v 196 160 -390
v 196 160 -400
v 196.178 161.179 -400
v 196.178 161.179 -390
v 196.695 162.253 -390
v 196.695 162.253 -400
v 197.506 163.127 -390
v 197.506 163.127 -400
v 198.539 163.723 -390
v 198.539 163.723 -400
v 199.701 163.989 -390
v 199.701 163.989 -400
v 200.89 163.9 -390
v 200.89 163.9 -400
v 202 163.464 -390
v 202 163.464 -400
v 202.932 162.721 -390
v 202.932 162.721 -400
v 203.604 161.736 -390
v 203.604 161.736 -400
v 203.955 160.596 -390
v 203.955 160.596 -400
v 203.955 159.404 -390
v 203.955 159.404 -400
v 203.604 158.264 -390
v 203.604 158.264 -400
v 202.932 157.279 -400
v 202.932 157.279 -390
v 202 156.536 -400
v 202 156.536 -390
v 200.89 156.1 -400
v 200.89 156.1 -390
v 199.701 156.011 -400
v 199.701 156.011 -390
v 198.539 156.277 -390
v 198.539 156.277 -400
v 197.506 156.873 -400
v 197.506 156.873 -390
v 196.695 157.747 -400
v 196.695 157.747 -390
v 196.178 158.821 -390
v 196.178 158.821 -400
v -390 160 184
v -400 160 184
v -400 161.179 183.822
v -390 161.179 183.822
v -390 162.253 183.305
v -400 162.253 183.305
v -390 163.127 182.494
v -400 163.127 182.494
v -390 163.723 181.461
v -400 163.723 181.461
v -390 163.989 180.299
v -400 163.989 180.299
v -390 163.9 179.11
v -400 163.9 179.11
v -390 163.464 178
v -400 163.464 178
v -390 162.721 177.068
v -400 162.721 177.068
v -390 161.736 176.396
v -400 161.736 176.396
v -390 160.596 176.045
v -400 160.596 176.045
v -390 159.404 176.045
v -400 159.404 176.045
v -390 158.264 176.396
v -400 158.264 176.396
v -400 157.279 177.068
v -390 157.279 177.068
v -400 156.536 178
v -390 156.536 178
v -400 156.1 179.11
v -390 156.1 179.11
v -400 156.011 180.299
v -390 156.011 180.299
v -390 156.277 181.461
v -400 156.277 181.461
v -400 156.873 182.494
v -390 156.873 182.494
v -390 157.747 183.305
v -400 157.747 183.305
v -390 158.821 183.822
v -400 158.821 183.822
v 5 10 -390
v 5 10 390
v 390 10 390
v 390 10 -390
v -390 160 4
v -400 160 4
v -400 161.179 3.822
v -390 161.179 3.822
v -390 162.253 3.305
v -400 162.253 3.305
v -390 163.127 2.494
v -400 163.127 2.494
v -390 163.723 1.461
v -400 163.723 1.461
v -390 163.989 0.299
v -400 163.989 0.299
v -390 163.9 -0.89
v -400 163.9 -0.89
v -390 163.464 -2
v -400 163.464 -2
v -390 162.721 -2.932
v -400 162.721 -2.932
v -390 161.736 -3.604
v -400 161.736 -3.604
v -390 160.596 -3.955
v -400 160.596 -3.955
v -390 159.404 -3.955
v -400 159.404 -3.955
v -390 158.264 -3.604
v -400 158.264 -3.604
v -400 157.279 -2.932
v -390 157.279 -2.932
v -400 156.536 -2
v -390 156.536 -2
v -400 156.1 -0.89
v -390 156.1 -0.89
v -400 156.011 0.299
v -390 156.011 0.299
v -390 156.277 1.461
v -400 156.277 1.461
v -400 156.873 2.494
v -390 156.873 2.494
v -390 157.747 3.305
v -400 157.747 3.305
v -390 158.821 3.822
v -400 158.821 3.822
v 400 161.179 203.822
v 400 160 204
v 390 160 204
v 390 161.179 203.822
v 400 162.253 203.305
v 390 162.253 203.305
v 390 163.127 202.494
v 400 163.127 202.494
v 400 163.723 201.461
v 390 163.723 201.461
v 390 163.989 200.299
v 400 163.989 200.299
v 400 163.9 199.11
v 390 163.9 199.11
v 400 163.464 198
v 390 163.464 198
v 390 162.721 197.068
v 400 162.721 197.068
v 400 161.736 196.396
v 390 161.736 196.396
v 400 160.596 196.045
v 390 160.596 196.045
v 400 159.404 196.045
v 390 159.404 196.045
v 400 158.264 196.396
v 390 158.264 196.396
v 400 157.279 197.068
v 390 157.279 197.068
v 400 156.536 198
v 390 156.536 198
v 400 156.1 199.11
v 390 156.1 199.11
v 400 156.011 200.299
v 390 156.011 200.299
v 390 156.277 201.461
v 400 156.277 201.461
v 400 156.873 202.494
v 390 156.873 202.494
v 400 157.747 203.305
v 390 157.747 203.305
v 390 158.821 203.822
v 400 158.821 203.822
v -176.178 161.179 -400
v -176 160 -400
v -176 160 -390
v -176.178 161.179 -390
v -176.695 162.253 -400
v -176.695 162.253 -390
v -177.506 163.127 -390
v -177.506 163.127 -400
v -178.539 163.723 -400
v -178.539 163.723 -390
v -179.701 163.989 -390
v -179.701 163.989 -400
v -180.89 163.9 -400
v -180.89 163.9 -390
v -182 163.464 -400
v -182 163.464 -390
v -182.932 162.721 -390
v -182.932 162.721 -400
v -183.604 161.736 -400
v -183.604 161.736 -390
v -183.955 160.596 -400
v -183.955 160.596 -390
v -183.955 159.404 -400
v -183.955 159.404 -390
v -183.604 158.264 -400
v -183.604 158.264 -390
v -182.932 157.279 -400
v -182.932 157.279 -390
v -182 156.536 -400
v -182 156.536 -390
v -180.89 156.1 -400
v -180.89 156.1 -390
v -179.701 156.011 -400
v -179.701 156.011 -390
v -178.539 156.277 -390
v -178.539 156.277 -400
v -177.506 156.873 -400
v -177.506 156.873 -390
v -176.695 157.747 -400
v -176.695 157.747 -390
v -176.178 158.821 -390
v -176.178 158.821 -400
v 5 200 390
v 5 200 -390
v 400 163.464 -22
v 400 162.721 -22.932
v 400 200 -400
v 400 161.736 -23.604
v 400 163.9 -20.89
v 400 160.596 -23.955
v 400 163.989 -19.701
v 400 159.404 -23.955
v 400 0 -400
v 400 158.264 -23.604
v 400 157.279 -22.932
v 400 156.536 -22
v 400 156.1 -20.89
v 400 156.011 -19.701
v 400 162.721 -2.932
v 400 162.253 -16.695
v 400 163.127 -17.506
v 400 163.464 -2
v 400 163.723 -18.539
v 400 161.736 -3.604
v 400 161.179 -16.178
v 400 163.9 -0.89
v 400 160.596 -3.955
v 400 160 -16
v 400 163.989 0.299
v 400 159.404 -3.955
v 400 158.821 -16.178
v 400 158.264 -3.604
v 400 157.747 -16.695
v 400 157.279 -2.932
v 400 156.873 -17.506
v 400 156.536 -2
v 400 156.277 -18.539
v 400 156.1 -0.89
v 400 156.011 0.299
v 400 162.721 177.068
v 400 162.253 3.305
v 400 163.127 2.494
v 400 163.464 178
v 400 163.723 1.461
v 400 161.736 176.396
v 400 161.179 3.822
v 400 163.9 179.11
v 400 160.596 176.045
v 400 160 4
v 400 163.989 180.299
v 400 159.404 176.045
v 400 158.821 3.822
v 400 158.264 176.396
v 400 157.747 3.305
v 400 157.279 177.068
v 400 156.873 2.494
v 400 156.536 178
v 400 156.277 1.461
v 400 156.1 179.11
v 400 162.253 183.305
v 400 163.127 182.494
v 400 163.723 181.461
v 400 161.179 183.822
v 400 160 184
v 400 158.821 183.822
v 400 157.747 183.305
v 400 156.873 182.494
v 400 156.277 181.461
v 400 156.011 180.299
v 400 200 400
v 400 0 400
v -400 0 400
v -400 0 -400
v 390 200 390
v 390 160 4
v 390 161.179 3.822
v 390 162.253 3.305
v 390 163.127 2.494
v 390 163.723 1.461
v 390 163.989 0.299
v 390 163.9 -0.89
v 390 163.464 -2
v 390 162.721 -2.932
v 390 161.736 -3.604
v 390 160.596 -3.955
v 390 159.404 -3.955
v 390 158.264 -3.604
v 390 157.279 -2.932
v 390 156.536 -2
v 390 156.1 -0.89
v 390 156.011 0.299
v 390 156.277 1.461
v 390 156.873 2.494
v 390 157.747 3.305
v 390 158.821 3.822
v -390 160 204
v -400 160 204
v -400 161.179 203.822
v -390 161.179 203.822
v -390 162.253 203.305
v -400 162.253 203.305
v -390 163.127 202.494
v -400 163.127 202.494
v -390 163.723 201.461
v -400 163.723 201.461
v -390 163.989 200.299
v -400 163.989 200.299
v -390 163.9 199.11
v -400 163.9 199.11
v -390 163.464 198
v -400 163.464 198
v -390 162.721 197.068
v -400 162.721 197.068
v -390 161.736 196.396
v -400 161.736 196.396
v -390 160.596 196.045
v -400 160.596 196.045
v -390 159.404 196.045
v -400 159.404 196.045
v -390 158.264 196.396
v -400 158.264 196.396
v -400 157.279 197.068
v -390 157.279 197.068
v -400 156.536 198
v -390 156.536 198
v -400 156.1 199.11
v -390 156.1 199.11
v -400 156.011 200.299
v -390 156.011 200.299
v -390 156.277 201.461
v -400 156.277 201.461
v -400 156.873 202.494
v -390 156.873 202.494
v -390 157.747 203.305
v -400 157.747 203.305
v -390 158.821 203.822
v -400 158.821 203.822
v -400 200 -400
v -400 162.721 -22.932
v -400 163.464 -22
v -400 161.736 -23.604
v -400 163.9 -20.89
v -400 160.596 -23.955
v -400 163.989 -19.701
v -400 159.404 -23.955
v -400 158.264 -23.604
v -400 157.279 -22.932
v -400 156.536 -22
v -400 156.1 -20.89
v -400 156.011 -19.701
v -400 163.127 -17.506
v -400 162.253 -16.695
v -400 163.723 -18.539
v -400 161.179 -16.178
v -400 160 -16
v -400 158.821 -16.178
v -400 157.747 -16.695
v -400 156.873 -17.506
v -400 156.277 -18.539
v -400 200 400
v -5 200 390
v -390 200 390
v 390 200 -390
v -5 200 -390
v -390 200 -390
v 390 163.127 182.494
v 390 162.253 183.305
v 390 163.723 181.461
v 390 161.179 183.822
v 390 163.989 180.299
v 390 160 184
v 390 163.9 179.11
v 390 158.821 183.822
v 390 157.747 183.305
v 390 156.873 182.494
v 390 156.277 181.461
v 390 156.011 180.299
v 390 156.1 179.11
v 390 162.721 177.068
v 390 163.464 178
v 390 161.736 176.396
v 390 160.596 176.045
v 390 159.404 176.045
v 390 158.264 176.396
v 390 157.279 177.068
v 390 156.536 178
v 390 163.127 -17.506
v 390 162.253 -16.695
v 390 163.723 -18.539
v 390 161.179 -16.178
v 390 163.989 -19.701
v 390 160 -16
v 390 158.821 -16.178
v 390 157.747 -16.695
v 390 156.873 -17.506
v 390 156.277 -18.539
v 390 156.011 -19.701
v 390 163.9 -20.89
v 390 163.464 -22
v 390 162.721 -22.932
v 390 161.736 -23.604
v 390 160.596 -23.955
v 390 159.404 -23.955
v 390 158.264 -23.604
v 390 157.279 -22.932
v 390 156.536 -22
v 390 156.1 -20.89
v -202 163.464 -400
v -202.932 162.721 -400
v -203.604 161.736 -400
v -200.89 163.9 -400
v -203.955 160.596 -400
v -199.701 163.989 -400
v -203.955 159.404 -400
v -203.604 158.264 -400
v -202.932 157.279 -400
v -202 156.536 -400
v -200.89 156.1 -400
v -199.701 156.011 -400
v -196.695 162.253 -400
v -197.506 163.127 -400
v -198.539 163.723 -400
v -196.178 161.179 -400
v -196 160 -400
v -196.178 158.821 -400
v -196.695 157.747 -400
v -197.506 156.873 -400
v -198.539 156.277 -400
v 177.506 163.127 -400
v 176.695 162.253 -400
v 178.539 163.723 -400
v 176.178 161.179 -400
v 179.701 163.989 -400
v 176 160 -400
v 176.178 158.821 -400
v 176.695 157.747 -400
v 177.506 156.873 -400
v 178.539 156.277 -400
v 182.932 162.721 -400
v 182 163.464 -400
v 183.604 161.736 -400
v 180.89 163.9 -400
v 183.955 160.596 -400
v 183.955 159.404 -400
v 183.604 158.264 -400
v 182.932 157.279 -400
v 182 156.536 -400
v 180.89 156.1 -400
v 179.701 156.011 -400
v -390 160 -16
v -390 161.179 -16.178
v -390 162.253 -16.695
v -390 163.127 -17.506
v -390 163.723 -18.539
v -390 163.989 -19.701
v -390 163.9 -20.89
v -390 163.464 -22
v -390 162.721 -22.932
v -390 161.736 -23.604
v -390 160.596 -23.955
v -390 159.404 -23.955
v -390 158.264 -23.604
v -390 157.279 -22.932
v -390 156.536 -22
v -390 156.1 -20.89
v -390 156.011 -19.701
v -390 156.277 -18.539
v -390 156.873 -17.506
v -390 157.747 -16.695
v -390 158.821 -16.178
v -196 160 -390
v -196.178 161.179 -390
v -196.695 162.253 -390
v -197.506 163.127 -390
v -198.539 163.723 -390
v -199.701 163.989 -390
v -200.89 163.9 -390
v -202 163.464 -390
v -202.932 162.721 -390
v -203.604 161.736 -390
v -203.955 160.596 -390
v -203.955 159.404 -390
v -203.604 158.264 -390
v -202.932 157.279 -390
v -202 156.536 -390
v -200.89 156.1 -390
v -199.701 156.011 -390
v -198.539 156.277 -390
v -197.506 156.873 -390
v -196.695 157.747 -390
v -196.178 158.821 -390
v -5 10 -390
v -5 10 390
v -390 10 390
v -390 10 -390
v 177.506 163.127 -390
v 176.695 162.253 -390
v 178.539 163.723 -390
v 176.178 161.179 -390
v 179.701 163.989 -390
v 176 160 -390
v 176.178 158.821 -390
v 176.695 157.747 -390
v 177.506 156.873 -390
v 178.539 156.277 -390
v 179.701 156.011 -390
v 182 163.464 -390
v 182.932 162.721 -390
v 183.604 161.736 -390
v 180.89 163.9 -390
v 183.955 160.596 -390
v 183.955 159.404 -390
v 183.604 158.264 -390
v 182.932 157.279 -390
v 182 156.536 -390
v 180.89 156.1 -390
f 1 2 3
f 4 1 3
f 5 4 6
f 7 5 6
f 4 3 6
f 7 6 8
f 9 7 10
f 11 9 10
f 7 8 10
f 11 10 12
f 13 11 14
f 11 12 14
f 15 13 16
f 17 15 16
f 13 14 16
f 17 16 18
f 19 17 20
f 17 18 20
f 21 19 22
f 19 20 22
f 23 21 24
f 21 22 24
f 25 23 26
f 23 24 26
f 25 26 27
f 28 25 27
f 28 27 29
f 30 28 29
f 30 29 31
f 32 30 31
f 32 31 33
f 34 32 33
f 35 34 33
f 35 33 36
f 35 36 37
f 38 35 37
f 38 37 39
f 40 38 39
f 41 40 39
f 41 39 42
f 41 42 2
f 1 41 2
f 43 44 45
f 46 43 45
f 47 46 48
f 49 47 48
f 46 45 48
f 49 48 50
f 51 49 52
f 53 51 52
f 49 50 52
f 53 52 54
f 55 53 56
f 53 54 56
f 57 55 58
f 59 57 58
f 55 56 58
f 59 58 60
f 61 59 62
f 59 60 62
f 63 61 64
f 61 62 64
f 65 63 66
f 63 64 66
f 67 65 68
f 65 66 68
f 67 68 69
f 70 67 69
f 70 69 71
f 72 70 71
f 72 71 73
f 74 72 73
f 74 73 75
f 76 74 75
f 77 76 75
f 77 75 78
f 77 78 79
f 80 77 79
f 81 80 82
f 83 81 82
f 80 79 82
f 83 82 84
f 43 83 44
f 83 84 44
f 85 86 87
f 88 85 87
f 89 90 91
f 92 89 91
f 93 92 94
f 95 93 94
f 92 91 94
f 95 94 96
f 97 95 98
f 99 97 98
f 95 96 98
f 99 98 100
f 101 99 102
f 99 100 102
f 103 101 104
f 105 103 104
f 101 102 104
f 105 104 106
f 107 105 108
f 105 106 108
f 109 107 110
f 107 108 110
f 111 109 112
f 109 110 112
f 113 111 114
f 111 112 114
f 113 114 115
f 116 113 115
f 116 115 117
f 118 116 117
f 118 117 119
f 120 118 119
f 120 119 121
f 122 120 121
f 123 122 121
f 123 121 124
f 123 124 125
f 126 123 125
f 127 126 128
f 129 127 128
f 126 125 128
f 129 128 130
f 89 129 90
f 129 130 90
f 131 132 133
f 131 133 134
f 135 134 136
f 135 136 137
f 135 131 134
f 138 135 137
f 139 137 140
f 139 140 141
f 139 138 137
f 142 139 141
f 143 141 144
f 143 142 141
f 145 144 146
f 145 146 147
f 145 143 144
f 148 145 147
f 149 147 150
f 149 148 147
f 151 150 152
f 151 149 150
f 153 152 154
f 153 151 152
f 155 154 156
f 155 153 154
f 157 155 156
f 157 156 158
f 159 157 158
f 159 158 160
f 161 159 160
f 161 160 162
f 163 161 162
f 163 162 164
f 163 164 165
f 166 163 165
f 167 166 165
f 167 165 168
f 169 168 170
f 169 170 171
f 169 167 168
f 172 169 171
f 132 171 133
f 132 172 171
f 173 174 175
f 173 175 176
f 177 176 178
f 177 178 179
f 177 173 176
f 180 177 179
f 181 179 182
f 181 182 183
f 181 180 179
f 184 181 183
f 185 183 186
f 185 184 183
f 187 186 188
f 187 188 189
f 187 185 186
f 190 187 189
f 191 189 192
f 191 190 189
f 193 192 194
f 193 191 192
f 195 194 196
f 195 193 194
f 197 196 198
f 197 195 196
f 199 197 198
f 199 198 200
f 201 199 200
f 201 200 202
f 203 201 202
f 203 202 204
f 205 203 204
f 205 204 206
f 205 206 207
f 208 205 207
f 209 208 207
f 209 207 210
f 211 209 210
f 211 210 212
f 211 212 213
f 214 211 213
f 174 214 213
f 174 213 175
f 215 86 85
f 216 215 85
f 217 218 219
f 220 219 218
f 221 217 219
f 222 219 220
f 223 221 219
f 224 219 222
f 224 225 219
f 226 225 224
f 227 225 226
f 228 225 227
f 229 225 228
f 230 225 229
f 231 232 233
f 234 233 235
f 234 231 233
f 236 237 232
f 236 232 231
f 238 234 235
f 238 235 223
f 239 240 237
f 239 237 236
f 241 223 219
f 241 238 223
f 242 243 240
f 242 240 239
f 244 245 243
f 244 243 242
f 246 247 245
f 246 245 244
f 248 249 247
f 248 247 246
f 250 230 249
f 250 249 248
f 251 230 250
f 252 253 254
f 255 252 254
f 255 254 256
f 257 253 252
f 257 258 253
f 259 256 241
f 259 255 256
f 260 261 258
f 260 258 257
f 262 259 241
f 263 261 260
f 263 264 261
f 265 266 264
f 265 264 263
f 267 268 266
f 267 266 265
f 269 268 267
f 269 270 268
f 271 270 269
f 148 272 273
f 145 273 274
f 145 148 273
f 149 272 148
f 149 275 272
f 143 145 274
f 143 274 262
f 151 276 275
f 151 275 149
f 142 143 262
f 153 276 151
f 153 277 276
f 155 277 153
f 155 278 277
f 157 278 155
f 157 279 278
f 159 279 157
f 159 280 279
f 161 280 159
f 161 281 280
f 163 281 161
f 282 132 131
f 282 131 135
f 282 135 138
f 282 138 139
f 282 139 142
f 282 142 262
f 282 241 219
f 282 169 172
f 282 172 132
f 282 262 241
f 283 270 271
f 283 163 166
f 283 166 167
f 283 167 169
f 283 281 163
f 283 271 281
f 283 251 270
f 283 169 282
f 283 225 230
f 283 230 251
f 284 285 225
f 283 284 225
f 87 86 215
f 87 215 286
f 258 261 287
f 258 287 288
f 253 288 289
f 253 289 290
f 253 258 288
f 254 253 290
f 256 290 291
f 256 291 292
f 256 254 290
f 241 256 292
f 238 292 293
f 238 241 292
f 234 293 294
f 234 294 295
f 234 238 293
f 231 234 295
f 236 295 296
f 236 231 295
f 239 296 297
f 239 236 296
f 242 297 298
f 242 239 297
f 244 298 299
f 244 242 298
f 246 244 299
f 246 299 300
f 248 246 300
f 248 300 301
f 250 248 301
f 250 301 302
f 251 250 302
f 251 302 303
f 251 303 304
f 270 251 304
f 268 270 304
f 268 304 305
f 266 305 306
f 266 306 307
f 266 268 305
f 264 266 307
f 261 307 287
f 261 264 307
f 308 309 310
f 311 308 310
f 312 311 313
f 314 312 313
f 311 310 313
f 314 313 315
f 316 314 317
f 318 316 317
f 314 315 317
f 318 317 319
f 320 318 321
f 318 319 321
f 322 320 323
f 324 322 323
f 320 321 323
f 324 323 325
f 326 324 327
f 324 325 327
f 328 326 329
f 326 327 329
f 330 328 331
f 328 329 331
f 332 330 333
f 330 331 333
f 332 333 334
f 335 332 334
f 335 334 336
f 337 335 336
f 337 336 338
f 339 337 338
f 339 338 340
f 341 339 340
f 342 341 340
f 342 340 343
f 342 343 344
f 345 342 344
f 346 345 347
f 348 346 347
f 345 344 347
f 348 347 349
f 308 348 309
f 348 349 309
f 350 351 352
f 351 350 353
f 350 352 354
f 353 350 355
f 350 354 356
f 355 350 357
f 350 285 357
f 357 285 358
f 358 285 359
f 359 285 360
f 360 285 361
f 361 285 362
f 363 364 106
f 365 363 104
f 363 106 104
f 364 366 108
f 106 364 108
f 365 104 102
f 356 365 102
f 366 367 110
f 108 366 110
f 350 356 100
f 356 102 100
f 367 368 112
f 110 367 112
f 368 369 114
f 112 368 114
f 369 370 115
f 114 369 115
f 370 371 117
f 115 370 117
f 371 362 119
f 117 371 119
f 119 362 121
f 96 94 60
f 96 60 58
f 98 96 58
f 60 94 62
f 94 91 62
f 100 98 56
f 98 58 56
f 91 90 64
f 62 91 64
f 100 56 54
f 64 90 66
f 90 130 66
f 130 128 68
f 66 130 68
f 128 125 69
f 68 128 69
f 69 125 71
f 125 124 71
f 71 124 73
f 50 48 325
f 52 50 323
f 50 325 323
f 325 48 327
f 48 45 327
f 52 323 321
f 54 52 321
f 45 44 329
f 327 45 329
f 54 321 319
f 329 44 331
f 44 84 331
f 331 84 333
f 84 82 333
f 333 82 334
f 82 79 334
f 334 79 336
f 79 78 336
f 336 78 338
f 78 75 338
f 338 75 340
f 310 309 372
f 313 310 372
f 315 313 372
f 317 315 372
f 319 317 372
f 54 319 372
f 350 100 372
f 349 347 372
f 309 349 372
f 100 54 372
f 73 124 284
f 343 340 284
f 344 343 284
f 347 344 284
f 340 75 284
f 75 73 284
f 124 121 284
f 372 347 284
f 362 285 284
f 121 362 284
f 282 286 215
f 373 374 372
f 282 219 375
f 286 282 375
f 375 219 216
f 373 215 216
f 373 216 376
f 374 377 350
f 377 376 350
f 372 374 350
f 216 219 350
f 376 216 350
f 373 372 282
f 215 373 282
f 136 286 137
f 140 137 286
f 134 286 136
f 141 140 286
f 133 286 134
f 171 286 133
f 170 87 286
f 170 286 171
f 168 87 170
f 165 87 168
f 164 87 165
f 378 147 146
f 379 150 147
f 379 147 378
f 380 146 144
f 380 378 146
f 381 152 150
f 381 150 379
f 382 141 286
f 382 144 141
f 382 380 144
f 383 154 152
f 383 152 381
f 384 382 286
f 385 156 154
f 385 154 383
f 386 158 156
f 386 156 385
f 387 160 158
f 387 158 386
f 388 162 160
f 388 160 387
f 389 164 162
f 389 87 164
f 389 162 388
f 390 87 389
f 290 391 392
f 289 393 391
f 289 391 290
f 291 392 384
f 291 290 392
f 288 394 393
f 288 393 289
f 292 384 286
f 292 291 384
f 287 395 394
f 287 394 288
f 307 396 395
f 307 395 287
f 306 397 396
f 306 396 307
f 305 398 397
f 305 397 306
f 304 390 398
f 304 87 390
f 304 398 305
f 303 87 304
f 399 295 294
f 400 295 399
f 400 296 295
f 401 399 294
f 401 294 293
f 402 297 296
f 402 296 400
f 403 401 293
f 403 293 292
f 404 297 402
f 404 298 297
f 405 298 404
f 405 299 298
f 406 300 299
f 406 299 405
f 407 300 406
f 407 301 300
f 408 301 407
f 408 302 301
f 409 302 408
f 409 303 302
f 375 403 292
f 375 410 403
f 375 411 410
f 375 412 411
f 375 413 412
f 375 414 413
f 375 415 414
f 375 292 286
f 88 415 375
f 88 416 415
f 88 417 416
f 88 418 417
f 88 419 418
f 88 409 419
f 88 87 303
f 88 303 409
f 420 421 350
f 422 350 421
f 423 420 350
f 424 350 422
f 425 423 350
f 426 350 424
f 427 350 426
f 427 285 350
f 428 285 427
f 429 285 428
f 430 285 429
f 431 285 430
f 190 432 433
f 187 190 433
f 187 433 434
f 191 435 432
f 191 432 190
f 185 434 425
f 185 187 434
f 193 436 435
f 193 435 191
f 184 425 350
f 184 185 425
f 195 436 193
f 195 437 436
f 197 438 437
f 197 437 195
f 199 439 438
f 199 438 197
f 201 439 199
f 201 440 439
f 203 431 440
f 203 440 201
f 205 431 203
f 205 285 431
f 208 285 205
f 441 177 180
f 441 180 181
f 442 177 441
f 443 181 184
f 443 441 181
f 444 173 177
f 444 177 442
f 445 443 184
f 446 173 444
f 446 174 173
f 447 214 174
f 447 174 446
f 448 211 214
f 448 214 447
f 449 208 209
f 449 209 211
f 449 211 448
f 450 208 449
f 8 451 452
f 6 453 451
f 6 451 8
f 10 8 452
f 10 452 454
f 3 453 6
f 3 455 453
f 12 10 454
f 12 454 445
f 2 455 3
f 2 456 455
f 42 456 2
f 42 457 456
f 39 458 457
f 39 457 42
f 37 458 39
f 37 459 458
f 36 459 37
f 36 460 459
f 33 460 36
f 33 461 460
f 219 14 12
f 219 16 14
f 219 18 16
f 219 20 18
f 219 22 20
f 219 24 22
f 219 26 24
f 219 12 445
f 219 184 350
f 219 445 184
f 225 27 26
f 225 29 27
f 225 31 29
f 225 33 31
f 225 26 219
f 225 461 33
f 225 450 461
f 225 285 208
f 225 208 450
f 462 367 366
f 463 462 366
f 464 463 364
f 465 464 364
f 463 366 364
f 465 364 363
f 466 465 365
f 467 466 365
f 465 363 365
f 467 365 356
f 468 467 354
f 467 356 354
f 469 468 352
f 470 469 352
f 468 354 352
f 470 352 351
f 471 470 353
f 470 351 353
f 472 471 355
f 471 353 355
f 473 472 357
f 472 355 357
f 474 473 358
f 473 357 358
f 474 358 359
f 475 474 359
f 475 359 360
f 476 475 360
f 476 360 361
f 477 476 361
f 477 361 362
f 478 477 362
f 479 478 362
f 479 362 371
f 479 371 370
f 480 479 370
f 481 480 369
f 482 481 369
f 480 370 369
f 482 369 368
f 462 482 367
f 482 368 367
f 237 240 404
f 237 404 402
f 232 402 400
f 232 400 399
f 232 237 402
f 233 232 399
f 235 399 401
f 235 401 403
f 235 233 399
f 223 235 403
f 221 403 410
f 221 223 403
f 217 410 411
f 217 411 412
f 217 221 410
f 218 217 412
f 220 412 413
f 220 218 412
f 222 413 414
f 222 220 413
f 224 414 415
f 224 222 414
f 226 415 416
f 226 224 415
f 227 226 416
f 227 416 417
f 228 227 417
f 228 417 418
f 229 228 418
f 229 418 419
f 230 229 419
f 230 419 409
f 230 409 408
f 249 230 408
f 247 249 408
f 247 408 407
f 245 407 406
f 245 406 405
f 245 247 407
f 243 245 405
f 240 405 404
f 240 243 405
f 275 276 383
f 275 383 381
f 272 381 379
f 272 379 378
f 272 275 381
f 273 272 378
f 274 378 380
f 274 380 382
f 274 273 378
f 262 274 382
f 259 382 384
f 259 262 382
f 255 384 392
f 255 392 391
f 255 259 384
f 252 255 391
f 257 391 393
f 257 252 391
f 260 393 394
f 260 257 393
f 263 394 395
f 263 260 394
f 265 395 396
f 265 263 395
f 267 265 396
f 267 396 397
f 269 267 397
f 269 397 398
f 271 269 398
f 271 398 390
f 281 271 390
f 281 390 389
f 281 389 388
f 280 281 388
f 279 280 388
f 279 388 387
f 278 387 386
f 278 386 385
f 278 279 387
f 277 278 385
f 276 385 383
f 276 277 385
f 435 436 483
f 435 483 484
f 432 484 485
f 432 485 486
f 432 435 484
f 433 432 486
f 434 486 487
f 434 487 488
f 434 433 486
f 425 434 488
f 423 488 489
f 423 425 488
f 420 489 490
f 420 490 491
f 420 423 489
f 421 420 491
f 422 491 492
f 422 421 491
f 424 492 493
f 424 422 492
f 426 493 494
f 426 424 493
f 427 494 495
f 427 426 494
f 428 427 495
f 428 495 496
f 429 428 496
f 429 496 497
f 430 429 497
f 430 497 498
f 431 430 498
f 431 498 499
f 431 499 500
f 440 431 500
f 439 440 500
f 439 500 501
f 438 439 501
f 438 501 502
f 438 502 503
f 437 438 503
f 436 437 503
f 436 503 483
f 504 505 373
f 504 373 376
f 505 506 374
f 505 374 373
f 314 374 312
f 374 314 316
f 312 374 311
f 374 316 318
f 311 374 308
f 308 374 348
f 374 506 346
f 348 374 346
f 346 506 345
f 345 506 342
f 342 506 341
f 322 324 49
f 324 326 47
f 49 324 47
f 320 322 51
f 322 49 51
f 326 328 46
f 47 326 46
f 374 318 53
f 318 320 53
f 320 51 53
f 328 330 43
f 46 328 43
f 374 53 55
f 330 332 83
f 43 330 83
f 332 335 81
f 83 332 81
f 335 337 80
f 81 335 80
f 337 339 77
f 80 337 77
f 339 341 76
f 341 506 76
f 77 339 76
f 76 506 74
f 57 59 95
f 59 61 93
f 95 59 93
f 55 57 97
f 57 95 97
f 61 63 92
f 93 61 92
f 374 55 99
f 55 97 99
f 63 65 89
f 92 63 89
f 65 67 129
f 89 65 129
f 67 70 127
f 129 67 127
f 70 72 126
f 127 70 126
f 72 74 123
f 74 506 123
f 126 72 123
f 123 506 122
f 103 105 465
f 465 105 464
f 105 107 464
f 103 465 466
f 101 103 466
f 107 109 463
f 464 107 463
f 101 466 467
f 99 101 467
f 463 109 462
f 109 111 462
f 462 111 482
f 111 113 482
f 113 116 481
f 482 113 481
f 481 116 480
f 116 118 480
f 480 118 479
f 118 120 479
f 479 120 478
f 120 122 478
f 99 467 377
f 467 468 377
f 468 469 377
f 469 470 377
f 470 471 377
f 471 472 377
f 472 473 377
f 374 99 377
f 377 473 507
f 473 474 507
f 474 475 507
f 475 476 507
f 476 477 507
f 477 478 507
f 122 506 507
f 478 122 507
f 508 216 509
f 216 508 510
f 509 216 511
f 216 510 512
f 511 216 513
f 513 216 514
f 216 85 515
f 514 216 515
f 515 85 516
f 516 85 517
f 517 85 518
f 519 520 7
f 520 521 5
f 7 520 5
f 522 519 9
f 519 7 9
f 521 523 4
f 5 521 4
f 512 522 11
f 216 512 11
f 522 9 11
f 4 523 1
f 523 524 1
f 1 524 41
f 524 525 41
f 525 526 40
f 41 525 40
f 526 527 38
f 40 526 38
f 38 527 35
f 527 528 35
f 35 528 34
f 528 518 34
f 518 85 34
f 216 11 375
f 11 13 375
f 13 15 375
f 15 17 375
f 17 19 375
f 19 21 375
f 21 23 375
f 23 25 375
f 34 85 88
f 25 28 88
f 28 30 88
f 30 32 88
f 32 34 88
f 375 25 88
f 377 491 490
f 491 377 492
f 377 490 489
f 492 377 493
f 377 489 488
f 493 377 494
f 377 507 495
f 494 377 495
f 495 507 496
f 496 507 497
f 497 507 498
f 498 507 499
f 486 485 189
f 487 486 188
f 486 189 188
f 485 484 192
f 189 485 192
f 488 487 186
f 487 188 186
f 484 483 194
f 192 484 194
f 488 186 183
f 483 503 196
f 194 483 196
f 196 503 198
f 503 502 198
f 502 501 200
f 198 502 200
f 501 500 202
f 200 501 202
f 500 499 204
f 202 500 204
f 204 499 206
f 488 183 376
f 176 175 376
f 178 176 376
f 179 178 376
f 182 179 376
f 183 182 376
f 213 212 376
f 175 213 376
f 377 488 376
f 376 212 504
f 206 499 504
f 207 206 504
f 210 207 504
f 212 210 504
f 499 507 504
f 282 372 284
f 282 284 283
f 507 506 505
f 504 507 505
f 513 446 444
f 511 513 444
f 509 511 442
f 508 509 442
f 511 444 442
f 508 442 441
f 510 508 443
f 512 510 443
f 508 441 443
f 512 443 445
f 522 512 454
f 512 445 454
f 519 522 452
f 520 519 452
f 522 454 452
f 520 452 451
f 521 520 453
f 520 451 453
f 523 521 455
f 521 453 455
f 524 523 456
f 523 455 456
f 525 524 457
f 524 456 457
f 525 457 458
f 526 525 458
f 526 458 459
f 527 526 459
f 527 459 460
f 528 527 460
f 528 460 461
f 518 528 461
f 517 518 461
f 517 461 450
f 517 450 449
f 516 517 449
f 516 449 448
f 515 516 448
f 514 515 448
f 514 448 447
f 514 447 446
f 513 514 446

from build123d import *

# Parameters (mm, degrees)
SKETCH_1_W          = 800
SKETCH_1_H          = 800
SKETCH_1_W_2        = 385
SKETCH_1_H_2        = 780
EXTRUDE_1_DEPTH     = 200
SKETCH_2_W          = 800
SKETCH_2_H          = 800
EXTRUDE_2_DEPTH     = 10
EXTRUDE_3_DEPTH     = 10
EXTRUDE_3_2_DEPTH   = 10
SKETCH_4_R          = 4
CUT_EXTRUDE_1_DEPTH = 10
SKETCH_5_R          = 4
CUT_EXTRUDE_2_DEPTH = 10
EXTRUDE_4_DEPTH     = 10
CUT_EXTRUDE_3_REACH = 1087.28
SKETCH_7_R          = 4
CUT_EXTRUDE_4_REACH = 1156.96
SKETCH_8_R          = 4
SKETCH_9_W          = 2800
SKETCH_9_H          = 2800
SKETCH_9_W_2        = 800
SKETCH_9_H_2        = 800
CUT_EXTRUDE_5_DEPTH = 1157.647305275


with BuildPart() as part:
    # 草图1 → 凸台-拉伸1 (new body)
    with BuildSketch(Plane(origin=(0, 0, 0), x_dir=(1, 0, 0), z_dir=(0, 1, 0))):
        Rectangle(SKETCH_1_W, SKETCH_1_H)
        with Locations((-197.5, 0)):
            Rectangle(SKETCH_1_W_2, SKETCH_1_H_2, mode=Mode.SUBTRACT)
        with Locations((197.5, 0)):
            Rectangle(SKETCH_1_W_2, SKETCH_1_H_2, mode=Mode.SUBTRACT)
    extrude(amount=EXTRUDE_1_DEPTH)

    # 草图2 → 凸台-拉伸2 (add)
    with BuildSketch(Plane.XZ):
        Rectangle(SKETCH_2_W, SKETCH_2_H)
    extrude(amount=-EXTRUDE_2_DEPTH)

    # 草图4 → 切除-拉伸1 (cut)
    with BuildSketch(Plane.ZY.offset(400)):
        with Locations((180, 160)):
            Circle(SKETCH_4_R)
        with Locations((200, 160)):
            Circle(SKETCH_4_R)
        with Locations((-20, 160)):
            Circle(SKETCH_4_R)
        with Locations((0, 160)):
            Circle(SKETCH_4_R)
    cut_extrude_1 = extrude(amount=-CUT_EXTRUDE_1_DEPTH, mode=Mode.SUBTRACT)


with BuildPart() as body_2:
    # 草图3 → 凸台-拉伸3 (new body)
    with BuildSketch(Plane(origin=(0, 200, 0), x_dir=(1, 0, 0), z_dir=(0, 1, 0))):
        with BuildLine():
            Line((-400, 400), (-400, -400))
            Line((-400, -400), (-552.7864045, -400))
            ThreePointArc((-552.7864045, -400), (-682.754282993, -327.538161854), (-689.4427191, -178.8854382))
            Line((-689.4427191, -178.8854382), (-400, 400))
        make_face()
    extrude(amount=-EXTRUDE_3_DEPTH)

    # 草图5 → 切除-拉伸2 (cut)
    with BuildSketch(Plane(origin=(0, 200, 0), x_dir=(1, 0, 0), z_dir=(0, 1, 0))):
        with Locations(Location((-430, -180, 0), (0, 0, 270))):
            Circle(SKETCH_5_R)
        with Locations(Location((-430, -200, 0), (0, 0, 270))):
            Circle(SKETCH_5_R)
        with Locations(Location((-430, 20, 0), (0, 0, 270))):
            Circle(SKETCH_5_R)
        with Locations(Location((-430, 0, 0), (0, 0, 270))):
            Circle(SKETCH_5_R)
    cut_extrude_2 = extrude(amount=-CUT_EXTRUDE_2_DEPTH, mode=Mode.SUBTRACT)


with BuildPart() as body_3:
    # 草图3 → Extrude 3 2 (new body)
    with BuildSketch(Plane(origin=(0, 200, 0), x_dir=(1, 0, 0), z_dir=(0, 1, 0))):
        with BuildLine():
            Line((689.4427191, -178.8854382), (400, 400))
            Line((400, 400), (400, -400))
            Line((400, -400), (552.7864045, -400))
            ThreePointArc((552.7864045, -400), (682.754282993, -327.538161854), (689.4427191, -178.8854382))
        make_face()
    extrude(amount=-EXTRUDE_3_2_DEPTH)


with BuildPart() as mirror_1_tool:
    # 镜向1: 切除-拉伸1, 切除-拉伸2 across plane
    add(cut_extrude_1.mirror(Plane(origin=(0, 0, 0), x_dir=(0, 0, 1), z_dir=(1, 0, 0))))
    add(cut_extrude_2.mirror(Plane(origin=(0, 0, 0), x_dir=(0, 0, 1), z_dir=(1, 0, 0))))


with BuildPart() as part_1:
    add(part.part)

    # 镜向1: cut by mirror_1_tool
    add(mirror_1_tool.part, mode=Mode.SUBTRACT)


    add(body_2.part)  # 凸台-拉伸4 merges body 2


with BuildPart() as body_3_1:
    add(body_3.part)

    # 镜向1: cut by mirror_1_tool
    add(mirror_1_tool.part, mode=Mode.SUBTRACT)


with BuildPart() as part_2:
    add(part_1.part)

    add(body_3_1.part)  # 凸台-拉伸4 merges body 3
    # 草图6 → 凸台-拉伸4 (add)
    with BuildSketch(Plane(origin=(0, 200, 0), x_dir=(1, 0, 0), z_dir=(0, 1, 0))):
        with BuildLine():
            Line((-400, 400), (-221.1145618, 757.7708764))
            ThreePointArc((-221.1145618, 757.7708764), (0, 894.427191), (221.1145618, 757.7708764))
            Line((221.1145618, 757.7708764), (400, 400))
            Line((400, 400), (-400, 400))
        make_face()
    extrude(amount=-EXTRUDE_4_DEPTH)

    # 草图7 → 切除-拉伸3 (cut, up to next)
    with BuildSketch(Plane(origin=(0, 0, -400), x_dir=(-1, 0, 0), z_dir=(0, 0, -1)), mode=Mode.PRIVATE) as cut_extrude_3_sk1:
        with Locations((-200, 160)):
            Circle(SKETCH_7_R)
    cut_extrude_3_tool1 = extrude(cut_extrude_3_sk1.sketch, amount=-CUT_EXTRUDE_3_REACH, mode=Mode.PRIVATE) & part_2.part
    # 草图7 → 切除-拉伸3 (cut, up to next)
    with BuildSketch(Plane(origin=(0, 0, -400), x_dir=(-1, 0, 0), z_dir=(0, 0, -1)), mode=Mode.PRIVATE) as cut_extrude_3_sk2:
        with Locations((-180, 160)):
            Circle(SKETCH_7_R)
    cut_extrude_3_tool2 = extrude(cut_extrude_3_sk2.sketch, amount=-CUT_EXTRUDE_3_REACH, mode=Mode.PRIVATE) & part_2.part
    cut_extrude_3_1 = cut_extrude_3_tool1.solids().sort_by_distance((200, 160, -400))[0]
    add(cut_extrude_3_1, mode=Mode.SUBTRACT)
    cut_extrude_3_2 = cut_extrude_3_tool2.solids().sort_by_distance((180, 160, -400))[0]
    add(cut_extrude_3_2, mode=Mode.SUBTRACT)
    cut_extrude_3 = cut_extrude_3_1 + cut_extrude_3_2  # 切除-拉伸3 as one shape, for the pattern or mirror that repeats it

    # 草图8 → 切除-拉伸4 (cut, up to next)
    with BuildSketch(Plane.XZ.offset(-190), mode=Mode.PRIVATE) as cut_extrude_4_sk1:
        with Locations(Location((180, -430, 0), (0, 0, 270))):
            Circle(SKETCH_8_R)
    cut_extrude_4_tool1 = extrude(cut_extrude_4_sk1.sketch, amount=-CUT_EXTRUDE_4_REACH, mode=Mode.PRIVATE) & part_2.part
    # 草图8 → 切除-拉伸4 (cut, up to next)
    with BuildSketch(Plane.XZ.offset(-190), mode=Mode.PRIVATE) as cut_extrude_4_sk2:
        with Locations(Location((200, -430, 0), (0, 0, 270))):
            Circle(SKETCH_8_R)
    cut_extrude_4_tool2 = extrude(cut_extrude_4_sk2.sketch, amount=-CUT_EXTRUDE_4_REACH, mode=Mode.PRIVATE) & part_2.part
    cut_extrude_4_1 = cut_extrude_4_tool1.solids().sort_by_distance((180, 190, -430))[0]
    add(cut_extrude_4_1, mode=Mode.SUBTRACT)
    cut_extrude_4_2 = cut_extrude_4_tool2.solids().sort_by_distance((200, 190, -430))[0]
    add(cut_extrude_4_2, mode=Mode.SUBTRACT)
    cut_extrude_4 = cut_extrude_4_1 + cut_extrude_4_2  # 切除-拉伸4 as one shape, for the pattern or mirror that repeats it

    # 镜向2: 切除-拉伸3, 切除-拉伸4 across plane
    add(cut_extrude_3.mirror(Plane(origin=(0, 0, 0), x_dir=(0, 0, 1), z_dir=(1, 0, 0))), mode=Mode.SUBTRACT)
    add(cut_extrude_4.mirror(Plane(origin=(0, 0, 0), x_dir=(0, 0, 1), z_dir=(1, 0, 0))), mode=Mode.SUBTRACT)

    # 草图9 → 切除-拉伸5 (cut, through all)
    with BuildSketch(Plane.XZ):
        Rectangle(SKETCH_9_W, SKETCH_9_H)
        Rectangle(SKETCH_9_W_2, SKETCH_9_H_2, mode=Mode.SUBTRACT)
    extrude(amount=-CUT_EXTRUDE_5_DEPTH, mode=Mode.SUBTRACT)


solid = part_2.part
